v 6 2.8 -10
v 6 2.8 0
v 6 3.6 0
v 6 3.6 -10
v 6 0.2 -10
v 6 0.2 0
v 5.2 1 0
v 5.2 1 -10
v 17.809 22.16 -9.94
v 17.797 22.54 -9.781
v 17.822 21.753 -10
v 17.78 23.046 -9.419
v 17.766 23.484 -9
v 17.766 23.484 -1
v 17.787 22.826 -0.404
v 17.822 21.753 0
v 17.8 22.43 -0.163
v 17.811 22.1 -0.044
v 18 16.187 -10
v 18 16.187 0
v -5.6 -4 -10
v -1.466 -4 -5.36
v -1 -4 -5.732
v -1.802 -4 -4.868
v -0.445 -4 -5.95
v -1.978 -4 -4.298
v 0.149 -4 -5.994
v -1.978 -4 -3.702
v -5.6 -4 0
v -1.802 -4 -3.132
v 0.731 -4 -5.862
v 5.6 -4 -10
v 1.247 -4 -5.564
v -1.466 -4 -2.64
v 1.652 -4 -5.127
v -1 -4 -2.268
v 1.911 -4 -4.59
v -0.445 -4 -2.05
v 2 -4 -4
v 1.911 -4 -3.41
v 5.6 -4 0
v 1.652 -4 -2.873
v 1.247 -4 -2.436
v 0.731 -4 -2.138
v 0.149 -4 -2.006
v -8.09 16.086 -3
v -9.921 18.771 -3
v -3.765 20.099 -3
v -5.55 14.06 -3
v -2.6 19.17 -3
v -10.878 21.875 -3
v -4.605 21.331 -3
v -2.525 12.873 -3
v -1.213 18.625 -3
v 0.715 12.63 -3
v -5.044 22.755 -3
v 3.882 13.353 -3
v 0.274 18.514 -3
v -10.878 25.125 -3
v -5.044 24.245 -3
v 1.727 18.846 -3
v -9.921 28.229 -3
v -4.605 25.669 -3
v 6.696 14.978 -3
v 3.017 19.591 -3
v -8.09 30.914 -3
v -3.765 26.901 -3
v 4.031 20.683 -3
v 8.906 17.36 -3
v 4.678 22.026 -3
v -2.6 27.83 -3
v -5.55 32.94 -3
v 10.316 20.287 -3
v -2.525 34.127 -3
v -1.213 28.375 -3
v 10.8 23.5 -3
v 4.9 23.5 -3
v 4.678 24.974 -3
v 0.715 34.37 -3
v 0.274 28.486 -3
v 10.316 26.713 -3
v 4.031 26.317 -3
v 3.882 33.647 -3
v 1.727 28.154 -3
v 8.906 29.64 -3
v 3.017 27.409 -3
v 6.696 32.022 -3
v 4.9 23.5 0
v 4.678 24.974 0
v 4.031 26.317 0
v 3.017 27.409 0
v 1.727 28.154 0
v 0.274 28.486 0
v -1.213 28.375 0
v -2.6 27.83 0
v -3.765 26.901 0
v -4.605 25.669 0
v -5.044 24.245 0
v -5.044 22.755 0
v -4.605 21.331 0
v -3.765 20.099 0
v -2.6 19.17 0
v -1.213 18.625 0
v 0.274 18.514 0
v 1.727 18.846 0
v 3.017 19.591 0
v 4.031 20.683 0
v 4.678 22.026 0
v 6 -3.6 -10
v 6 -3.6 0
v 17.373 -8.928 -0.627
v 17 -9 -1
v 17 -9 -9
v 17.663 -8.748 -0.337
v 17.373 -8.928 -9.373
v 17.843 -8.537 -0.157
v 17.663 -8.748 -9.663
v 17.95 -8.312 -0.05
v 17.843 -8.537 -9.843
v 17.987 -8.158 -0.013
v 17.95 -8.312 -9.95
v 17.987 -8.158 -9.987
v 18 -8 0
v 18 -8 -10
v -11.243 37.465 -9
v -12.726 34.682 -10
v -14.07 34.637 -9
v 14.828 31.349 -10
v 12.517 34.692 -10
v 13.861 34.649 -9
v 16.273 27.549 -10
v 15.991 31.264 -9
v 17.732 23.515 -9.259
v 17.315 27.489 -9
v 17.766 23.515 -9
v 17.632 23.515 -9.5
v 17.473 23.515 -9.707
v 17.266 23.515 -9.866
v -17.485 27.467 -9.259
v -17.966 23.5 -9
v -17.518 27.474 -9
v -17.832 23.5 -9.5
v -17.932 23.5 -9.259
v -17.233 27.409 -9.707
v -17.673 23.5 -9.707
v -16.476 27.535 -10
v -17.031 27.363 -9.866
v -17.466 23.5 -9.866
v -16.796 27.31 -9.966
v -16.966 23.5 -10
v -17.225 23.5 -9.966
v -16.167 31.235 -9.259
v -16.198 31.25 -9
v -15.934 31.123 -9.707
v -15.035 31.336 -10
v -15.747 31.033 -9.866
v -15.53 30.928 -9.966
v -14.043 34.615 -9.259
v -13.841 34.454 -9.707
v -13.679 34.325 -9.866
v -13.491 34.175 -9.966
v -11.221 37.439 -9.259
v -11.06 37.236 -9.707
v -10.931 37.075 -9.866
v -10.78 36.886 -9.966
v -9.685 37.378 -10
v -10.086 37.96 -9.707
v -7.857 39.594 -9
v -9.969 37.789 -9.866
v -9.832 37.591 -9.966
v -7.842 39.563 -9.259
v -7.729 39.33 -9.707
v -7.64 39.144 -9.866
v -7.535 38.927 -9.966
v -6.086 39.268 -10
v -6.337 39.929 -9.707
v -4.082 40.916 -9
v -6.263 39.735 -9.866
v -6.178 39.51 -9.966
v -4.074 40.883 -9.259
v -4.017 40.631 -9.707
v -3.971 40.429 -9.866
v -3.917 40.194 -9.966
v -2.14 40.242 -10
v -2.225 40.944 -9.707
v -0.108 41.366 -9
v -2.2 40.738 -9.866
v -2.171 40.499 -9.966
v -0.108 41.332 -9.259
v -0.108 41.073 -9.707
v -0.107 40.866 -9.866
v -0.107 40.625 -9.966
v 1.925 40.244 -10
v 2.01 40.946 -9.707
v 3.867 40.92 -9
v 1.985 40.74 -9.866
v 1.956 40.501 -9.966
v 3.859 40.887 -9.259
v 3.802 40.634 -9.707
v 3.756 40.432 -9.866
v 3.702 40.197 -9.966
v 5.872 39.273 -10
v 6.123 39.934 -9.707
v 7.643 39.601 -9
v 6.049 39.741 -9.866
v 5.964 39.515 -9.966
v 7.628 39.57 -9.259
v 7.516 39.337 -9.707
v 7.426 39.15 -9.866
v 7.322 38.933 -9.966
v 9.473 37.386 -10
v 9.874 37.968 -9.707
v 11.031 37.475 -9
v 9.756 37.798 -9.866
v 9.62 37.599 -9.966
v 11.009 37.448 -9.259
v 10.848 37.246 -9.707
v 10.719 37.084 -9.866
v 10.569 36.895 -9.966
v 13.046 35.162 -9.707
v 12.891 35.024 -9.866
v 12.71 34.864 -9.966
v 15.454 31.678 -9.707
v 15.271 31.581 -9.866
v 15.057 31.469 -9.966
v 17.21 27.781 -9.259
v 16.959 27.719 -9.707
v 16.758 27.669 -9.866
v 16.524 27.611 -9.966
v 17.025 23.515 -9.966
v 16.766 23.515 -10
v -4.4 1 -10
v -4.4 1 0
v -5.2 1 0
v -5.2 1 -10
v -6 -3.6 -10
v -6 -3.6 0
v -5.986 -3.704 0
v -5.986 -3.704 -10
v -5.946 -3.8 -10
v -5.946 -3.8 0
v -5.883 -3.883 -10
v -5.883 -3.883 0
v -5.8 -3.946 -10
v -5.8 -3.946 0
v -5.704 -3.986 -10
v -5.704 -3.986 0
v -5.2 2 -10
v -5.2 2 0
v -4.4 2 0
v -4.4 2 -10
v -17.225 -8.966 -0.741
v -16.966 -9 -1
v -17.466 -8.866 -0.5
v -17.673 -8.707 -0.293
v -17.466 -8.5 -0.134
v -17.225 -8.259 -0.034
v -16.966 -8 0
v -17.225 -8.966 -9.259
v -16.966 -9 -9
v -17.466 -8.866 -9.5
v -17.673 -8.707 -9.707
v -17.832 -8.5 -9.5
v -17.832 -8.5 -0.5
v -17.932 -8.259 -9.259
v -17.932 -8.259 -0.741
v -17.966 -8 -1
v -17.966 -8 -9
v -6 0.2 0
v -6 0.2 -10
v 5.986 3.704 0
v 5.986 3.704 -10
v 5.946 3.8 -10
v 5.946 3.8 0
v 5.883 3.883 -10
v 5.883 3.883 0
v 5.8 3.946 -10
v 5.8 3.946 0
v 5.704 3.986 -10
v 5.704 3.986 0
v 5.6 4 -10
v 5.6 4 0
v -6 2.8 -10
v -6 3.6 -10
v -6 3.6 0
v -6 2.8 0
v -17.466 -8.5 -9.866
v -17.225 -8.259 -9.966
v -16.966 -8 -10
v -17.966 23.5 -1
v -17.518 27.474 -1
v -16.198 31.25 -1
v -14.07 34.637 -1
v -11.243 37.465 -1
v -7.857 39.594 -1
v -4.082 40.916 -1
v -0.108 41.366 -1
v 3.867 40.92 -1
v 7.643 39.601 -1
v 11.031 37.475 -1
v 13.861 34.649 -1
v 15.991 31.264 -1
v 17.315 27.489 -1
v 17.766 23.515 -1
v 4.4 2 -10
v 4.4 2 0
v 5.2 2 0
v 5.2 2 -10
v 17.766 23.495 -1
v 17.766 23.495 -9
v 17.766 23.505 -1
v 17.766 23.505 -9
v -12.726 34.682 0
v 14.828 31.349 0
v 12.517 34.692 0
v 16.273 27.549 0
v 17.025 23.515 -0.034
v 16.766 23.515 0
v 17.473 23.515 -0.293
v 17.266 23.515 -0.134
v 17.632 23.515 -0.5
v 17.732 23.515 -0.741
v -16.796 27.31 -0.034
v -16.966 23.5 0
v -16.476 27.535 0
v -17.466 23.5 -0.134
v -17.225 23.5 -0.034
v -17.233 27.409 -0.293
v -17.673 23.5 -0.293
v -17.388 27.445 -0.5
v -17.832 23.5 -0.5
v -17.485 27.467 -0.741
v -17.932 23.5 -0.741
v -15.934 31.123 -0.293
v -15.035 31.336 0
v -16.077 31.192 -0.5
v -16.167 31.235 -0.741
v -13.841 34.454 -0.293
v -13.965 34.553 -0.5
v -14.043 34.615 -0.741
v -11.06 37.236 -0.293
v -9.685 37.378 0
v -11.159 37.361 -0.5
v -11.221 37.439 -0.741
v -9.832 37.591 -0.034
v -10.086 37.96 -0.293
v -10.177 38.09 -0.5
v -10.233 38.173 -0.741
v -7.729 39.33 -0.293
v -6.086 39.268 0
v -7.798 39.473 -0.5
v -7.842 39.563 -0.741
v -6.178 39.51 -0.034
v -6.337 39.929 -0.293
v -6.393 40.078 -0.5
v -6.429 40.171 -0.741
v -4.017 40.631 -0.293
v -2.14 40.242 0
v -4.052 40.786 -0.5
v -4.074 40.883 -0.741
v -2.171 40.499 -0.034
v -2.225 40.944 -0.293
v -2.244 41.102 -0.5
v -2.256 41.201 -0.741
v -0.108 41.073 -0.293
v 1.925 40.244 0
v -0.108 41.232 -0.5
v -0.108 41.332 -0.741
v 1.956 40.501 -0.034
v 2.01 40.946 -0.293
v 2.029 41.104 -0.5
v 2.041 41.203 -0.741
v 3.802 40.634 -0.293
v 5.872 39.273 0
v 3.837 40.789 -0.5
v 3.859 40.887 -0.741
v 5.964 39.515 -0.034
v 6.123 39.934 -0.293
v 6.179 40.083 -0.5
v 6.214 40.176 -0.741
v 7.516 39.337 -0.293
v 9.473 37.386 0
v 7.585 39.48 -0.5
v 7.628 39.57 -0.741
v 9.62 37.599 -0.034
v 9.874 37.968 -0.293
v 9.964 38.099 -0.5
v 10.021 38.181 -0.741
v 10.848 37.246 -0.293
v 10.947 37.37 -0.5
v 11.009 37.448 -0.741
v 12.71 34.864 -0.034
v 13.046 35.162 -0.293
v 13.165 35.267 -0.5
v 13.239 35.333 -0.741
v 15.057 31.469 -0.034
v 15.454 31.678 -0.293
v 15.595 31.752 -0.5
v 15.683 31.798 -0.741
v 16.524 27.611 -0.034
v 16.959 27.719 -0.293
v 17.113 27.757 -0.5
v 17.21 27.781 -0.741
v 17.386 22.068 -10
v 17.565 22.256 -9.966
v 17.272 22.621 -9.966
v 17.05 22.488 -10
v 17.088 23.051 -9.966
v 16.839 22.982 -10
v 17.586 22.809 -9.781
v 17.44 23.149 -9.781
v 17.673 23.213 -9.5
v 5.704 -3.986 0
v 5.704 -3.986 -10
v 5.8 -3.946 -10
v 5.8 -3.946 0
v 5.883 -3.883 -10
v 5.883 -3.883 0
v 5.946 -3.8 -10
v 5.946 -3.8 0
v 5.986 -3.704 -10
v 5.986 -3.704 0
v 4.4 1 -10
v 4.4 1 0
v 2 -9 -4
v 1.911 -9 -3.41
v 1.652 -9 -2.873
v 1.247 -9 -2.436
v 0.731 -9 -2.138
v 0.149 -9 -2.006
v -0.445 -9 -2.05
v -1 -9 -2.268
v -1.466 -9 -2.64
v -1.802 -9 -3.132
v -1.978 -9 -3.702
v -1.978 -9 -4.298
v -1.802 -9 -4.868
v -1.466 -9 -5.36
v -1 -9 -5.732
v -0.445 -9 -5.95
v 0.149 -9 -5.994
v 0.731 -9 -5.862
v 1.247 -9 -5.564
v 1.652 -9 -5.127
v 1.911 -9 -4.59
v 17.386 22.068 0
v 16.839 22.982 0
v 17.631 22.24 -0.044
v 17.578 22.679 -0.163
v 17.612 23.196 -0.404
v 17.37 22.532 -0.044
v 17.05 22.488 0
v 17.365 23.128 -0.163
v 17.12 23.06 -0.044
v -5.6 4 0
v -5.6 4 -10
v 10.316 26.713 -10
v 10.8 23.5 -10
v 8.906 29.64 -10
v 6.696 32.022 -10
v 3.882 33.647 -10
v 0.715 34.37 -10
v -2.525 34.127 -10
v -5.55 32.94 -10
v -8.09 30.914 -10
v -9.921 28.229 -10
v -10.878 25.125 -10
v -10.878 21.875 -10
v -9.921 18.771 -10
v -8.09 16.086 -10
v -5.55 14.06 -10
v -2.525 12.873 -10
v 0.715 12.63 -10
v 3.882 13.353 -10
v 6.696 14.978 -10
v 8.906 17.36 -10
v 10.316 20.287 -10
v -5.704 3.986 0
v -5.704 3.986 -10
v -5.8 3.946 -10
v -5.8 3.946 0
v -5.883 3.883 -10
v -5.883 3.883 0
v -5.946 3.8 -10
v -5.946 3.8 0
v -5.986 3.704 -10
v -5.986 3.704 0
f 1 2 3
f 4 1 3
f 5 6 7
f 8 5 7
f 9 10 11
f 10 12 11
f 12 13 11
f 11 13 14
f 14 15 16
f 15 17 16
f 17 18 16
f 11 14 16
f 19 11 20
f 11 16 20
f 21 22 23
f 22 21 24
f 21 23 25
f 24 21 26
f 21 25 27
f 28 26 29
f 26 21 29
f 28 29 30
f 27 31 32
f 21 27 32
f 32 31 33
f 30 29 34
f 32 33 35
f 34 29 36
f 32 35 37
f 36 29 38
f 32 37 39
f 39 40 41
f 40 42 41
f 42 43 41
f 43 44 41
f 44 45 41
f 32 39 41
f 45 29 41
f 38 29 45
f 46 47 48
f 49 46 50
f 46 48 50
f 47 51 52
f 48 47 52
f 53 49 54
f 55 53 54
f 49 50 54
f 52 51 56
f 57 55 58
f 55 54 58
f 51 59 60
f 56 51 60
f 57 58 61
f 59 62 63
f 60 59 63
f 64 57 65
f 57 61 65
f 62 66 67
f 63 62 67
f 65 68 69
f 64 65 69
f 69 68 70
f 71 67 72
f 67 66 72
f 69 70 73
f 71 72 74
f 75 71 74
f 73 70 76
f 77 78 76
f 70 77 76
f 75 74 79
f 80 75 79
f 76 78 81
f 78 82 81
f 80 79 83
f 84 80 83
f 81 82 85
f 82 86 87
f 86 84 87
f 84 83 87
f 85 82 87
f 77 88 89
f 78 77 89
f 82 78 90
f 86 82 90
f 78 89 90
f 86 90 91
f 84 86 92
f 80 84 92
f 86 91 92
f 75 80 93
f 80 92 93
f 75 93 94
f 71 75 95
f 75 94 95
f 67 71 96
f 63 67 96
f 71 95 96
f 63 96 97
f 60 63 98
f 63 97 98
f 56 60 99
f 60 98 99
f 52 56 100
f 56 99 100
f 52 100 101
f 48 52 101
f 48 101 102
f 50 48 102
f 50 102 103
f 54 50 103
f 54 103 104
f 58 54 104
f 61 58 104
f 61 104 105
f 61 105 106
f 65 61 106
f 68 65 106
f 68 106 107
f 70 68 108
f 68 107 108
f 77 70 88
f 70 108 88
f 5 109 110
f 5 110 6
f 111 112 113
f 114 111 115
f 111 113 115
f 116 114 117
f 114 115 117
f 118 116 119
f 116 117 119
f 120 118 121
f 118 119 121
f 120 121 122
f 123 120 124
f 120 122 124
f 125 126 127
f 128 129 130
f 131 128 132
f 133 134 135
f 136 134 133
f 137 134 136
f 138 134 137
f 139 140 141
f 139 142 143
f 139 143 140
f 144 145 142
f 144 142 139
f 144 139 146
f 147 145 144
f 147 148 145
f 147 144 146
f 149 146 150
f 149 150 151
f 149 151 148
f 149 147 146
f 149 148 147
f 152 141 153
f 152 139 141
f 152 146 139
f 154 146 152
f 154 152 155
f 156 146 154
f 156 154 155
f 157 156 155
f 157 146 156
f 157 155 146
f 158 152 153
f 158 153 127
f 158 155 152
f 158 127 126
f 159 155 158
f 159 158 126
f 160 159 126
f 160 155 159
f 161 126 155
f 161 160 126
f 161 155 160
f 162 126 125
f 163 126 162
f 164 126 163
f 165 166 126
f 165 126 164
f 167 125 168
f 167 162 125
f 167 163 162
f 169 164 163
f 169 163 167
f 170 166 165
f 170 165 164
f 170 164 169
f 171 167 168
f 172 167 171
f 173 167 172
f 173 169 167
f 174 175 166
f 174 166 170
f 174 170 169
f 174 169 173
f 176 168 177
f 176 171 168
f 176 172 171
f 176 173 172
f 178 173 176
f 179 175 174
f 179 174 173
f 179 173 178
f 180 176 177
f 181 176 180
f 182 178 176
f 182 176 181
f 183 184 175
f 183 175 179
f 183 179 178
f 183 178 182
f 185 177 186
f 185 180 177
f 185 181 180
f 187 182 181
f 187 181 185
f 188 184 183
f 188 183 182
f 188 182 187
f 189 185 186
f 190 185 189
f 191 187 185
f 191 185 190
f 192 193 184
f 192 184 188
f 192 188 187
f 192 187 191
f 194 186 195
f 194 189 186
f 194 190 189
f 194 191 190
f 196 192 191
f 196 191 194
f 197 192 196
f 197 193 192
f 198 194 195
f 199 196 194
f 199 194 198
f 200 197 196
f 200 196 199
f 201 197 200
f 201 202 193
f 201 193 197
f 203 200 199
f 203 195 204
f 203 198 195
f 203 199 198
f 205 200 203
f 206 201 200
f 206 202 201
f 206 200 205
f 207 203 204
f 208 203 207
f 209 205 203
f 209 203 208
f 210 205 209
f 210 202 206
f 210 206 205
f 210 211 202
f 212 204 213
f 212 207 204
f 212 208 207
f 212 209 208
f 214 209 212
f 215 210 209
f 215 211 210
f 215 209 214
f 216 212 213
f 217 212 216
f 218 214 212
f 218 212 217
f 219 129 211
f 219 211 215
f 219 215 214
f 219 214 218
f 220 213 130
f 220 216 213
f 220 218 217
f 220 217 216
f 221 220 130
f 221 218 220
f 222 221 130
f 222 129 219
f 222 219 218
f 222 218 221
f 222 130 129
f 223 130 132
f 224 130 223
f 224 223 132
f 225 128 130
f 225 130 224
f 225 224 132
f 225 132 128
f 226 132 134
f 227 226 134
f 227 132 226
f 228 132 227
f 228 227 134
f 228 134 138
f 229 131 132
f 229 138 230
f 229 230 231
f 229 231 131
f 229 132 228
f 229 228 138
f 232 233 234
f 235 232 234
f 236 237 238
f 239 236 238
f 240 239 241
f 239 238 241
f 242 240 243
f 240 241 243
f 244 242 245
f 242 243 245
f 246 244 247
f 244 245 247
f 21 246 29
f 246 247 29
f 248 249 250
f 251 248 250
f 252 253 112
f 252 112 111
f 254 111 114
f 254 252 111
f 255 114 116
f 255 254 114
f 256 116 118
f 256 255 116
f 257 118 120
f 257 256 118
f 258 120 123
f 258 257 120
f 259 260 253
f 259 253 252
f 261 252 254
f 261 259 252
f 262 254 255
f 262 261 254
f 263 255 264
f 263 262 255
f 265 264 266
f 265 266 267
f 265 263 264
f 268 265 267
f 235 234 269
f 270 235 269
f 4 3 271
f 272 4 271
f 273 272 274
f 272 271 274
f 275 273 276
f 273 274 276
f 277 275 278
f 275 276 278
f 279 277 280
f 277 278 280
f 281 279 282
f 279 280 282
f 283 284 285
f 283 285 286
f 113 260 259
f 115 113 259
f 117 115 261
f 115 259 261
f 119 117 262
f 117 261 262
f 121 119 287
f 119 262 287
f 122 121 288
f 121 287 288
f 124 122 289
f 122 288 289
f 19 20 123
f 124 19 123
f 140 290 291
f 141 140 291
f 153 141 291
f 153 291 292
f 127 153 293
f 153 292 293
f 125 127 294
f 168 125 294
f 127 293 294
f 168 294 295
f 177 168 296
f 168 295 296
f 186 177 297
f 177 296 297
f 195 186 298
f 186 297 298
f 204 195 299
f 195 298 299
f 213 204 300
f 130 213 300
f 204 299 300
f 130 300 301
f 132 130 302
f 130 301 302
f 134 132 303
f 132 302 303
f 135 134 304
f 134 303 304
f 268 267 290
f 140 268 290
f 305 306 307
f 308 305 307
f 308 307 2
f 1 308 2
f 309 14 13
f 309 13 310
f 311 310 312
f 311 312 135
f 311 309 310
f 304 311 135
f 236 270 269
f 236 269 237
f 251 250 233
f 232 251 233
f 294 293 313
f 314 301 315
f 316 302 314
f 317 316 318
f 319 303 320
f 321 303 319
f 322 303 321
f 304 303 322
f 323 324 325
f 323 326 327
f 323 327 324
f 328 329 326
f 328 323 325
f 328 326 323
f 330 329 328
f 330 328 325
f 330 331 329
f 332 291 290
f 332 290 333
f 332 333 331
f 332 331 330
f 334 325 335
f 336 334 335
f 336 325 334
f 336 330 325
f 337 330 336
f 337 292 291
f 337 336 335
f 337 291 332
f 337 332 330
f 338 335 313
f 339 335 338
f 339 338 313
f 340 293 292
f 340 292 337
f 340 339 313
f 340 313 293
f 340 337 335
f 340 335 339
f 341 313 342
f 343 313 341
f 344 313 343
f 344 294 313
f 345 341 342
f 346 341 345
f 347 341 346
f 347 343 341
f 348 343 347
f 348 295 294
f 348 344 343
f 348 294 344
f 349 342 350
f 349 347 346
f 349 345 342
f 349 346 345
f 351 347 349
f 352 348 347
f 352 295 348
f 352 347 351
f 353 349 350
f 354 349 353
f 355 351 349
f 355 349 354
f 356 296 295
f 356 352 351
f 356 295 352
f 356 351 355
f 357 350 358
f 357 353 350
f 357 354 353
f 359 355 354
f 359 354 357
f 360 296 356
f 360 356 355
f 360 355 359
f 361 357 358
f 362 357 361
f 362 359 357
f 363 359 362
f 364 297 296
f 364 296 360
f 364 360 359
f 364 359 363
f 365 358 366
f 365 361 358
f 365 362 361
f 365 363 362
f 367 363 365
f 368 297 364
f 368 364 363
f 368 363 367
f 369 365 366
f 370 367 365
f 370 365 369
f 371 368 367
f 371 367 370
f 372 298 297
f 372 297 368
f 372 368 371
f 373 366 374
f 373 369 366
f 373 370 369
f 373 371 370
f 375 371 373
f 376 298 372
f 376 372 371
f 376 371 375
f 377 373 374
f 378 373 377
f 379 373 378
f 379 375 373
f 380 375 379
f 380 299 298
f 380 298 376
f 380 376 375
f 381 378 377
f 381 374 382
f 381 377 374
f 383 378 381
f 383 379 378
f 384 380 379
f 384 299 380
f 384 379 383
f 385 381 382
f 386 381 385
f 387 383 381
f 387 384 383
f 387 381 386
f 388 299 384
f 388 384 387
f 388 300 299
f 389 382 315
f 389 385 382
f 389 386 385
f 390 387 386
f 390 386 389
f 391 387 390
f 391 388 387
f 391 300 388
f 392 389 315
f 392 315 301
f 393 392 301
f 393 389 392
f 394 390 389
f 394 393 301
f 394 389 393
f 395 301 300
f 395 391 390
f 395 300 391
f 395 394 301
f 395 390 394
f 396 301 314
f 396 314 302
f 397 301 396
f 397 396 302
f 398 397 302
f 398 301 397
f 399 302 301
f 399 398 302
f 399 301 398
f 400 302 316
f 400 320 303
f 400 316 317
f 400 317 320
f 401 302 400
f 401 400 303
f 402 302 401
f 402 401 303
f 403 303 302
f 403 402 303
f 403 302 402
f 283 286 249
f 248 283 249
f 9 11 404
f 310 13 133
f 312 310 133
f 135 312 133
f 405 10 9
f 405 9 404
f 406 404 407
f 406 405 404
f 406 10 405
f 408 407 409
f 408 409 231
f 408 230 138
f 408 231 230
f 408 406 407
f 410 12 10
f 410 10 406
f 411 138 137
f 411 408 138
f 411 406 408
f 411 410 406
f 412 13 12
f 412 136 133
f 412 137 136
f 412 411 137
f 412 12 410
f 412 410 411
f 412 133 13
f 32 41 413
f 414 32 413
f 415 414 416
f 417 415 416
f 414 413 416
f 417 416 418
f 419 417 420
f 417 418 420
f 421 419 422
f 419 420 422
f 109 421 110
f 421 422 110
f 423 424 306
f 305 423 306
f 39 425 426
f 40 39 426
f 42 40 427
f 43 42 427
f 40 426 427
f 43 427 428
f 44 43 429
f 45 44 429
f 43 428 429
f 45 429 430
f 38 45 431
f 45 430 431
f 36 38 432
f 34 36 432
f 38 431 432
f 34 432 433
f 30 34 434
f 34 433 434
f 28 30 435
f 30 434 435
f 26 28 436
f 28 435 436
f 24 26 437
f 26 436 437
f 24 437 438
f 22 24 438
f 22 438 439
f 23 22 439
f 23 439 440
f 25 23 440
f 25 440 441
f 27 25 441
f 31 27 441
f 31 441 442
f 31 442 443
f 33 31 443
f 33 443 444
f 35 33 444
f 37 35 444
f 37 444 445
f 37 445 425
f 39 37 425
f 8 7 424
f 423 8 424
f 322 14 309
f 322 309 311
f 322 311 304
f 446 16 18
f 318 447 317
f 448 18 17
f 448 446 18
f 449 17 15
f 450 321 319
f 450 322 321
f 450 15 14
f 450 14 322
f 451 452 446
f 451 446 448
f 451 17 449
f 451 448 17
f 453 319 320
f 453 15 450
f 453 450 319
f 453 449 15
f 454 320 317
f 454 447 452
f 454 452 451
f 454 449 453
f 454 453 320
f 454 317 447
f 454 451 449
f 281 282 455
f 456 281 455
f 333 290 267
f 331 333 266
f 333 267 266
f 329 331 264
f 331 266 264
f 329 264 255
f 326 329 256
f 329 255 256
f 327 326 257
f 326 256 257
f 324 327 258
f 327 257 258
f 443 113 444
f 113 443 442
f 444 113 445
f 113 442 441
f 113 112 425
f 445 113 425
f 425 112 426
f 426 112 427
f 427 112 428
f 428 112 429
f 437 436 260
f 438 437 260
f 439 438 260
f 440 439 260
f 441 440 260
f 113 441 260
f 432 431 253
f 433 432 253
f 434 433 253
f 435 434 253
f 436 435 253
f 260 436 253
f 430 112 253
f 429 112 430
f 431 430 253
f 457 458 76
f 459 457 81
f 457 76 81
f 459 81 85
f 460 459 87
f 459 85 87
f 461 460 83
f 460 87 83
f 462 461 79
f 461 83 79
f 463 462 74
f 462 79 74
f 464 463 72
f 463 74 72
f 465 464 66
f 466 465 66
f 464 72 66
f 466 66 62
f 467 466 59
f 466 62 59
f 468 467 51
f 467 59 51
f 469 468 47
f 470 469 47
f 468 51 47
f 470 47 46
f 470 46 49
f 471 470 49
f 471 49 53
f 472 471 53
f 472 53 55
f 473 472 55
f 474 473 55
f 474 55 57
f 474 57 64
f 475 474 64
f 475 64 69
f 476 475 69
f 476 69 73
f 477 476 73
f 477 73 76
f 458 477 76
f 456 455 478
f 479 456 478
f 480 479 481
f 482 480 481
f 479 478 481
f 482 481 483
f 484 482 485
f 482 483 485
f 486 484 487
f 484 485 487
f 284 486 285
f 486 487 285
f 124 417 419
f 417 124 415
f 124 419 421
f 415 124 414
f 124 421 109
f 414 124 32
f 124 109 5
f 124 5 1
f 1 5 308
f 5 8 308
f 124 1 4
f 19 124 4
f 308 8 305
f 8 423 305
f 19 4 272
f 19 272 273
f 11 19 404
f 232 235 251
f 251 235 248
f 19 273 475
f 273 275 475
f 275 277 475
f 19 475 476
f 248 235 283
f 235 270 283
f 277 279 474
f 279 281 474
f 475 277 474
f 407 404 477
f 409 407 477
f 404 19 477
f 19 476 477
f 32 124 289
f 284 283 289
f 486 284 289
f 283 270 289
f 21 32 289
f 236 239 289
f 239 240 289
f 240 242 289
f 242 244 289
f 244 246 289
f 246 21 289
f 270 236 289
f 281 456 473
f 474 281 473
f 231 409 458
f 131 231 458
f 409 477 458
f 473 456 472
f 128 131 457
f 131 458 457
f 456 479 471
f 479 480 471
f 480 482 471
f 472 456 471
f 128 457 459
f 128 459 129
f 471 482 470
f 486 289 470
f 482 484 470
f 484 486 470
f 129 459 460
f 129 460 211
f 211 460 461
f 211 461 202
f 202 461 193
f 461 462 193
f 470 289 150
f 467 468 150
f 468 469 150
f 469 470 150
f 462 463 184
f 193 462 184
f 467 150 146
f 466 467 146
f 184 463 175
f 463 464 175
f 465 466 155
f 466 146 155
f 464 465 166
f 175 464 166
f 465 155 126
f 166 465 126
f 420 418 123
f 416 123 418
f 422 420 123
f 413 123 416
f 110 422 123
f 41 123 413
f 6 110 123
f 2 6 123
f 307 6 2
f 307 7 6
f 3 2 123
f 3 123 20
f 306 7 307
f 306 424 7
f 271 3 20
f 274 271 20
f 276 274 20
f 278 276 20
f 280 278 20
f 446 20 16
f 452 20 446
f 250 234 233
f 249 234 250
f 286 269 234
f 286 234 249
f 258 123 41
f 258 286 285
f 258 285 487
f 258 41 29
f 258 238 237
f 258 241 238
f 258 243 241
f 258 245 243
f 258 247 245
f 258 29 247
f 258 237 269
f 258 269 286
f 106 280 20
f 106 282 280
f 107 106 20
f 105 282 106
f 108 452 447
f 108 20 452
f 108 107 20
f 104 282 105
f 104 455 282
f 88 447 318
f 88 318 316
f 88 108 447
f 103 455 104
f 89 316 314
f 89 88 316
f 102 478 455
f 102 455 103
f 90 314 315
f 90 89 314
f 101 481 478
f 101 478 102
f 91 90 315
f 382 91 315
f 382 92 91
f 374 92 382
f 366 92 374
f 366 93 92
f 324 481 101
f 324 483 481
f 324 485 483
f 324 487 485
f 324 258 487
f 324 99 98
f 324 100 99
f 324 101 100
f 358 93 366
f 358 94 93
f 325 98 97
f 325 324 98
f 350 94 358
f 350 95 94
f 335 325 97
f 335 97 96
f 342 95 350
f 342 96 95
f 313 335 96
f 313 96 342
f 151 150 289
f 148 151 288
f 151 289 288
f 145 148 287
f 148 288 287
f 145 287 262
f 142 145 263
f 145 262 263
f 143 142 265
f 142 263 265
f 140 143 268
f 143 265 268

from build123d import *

# Parameters (mm, degrees)
SKETCH1_R           = 10.9
BOSS_EXTRUDE1_DEPTH = 10
FILLET5_R           = 1
FILLET1_R           = 1
SKETCH3_R           = 2
CUT_EXTRUDE2_DEPTH  = 8
SKETCH6_R           = 11.874719229
SKETCH6_R_2         = 5
BOSS_EXTRUDE3_DEPTH = 3


with BuildPart() as part:
    # Sketch1 → Boss-Extrude1 (new body)
    with BuildSketch(Plane.XY):
        with BuildLine():
            Line((18.000000111, 2.53629242), (18.000000111, -9))
            Line((18.000000111, -9), (-17.965840671, -9))
            Line((-17.965840671, -9), (-17.965840671, 23.5))
            ThreePointArc((-17.965840671, 23.5), (-0.099999918, 41.365840754), (17.765840836, 23.5))
            Line((17.765840836, 23.5), (18.000000111, 16.187309001))
            Line((18.000000111, 16.187309001), (18.000000111, 14.96196947))
            Line((18.000000111, 14.96196947), (18.000000111, 2.53629242))
        make_face()
        with Locations((-0.099999918, 23.5)):
            Circle(SKETCH1_R, mode=Mode.SUBTRACT)
        with BuildLine():
            Line((-4.4, 1), (-5.2, 1))
            Line((-5.2, 1), (-6, 0.2))
            Line((-6, 0.2), (-6, -3.6))
            ThreePointArc((-6, -3.6), (-5.882842712, -3.882842712), (-5.6, -4))
            Line((-5.6, -4), (5.6, -4))
            ThreePointArc((5.6, -4), (5.882842712, -3.882842712), (6, -3.6))
            Line((6, -3.6), (6, 0.2))
            Line((6, 0.2), (5.2, 1))
            Line((5.2, 1), (4.4, 1))
            Line((4.4, 1), (4.4, 2))
            Line((4.4, 2), (5.2, 2))
            Line((5.2, 2), (6, 2.8))
            Line((6, 2.8), (6, 3.6))
            ThreePointArc((6, 3.6), (5.882842712, 3.882842712), (5.6, 4))
            Line((5.6, 4), (-5.6, 4))
            ThreePointArc((-5.6, 4), (-5.882842712, 3.882842712), (-6, 3.6))
            Line((-6, 3.6), (-6, 2.8))
            Line((-6, 2.8), (-5.2, 2))
            Line((-5.2, 2), (-4.4, 2))
            Line((-4.4, 2), (-4.4, 1))
        make_face(mode=Mode.SUBTRACT)
    extrude(amount=-BOSS_EXTRUDE1_DEPTH)

    # Fillet5
    fillet5_edges = [part.edges().sort_by_distance(p)[0] for p in [
        (18.000000111, -9, -5),
        (-17.965840671, -9, -5),
        (0.01707972, -9, -10),
        (0.01707972, -9, 0),
    ]]
    fillet(fillet5_edges, radius=FILLET5_R)

    # Fillet1
    # the kernel refuses this fillet: 1 mm, written as the material it adds along each edge
    with BuildSketch(Plane(origin=(17.765840836, 23.5, 0), x_dir=(0.032004541259538756, -0.9994877234557543, 0), z_dir=(0, 0, -1))) as fillet1_piece_1:
        with BuildLine():
            CenterArc((0.015788393, -1), FILLET1_R, 90, 1.784765128)
            ThreePointArc((-0.015356597, -0.000485123), (-0.007678246, -0.000244212), (0, 0))
            Line((0, 0), (0.015788393, 0))
        make_face()
    extrude(amount=10)
    # the kernel refuses this fillet: 1 mm, written as the material it takes off along each edge
    with BuildSketch(Plane(origin=(-17.965840671, -10.5, -10), x_dir=(1, 0, 0), z_dir=(0, 1, 0)), Plane(origin=(-17.965840671, -10.5, 0), x_dir=(0, 0, -1), z_dir=(0, 1, 0))) as fillet1_2_piece_1:
        with BuildLine():
            CenterArc((FILLET1_R, -FILLET1_R), FILLET1_R, 90, 90)
            Line((0, -FILLET1_R), (0, 0))
            Line((0, 0), (FILLET1_R, 0))
        make_face()
    extrude(amount=34, mode=Mode.SUBTRACT)
    with BuildSketch(Plane(origin=(-0.099999918, 23.5, -10), x_dir=(-1, 0, 0), z_dir=(0, -1, 0))) as fillet1_2_piece_2:
        with BuildLine():
            CenterArc((17.865840754 - FILLET1_R, -FILLET1_R), FILLET1_R, 0, 90)
            Line((17.865840754, -FILLET1_R), (17.865840754, 0))
            Line((17.865840754, 0), (17.865840754 - FILLET1_R, 0))
        make_face()
    revolve(axis=Axis((-0.099999918, 23.5, -10), (0, 0, -1)), revolution_arc=179.950726799, mode=Mode.SUBTRACT)
    with BuildSketch(Plane(origin=(-0.099999918, 23.5, 0), x_dir=(-1, 0, 0), z_dir=(0, -1, 0))) as fillet1_2_piece_3:
        with BuildLine():
            CenterArc((17.865840754 - FILLET1_R, FILLET1_R), FILLET1_R, 270, 90)
            Line((17.865840754 - FILLET1_R, 0), (17.865840754, 0))
            Line((17.865840754, 0), (17.865840754, FILLET1_R))
        make_face()
    revolve(axis=Axis((-0.099999918, 23.5, 0), (0, 0, -1)), revolution_arc=179.950726799, mode=Mode.SUBTRACT)
    with BuildSketch(Plane(origin=(18.76583386, 23.516224236, 0), x_dir=(0.8198872609406254, -0.5725250032507568, 0), z_dir=(0.5725250032507568, 0.8198872609406254, 0))) as fillet1_2_piece_4:
        with BuildLine():
            CenterArc((1 + FILLET1_R, FILLET1_R), FILLET1_R, 180, 90)
            Line((1, FILLET1_R), (1, 0))
            Line((1, 0), (1 + FILLET1_R, 0))
        make_face()
    revolve(axis=Axis((18.76583386, 23.516224236, 0), (0, 0, -1)), revolution_arc=145.024236532, mode=Mode.SUBTRACT)
    with BuildSketch(Plane(origin=(18.76583386, 23.516224236, -10), x_dir=(0.8198872609406254, -0.5725250032507568, 0), z_dir=(0.5725250032507568, 0.8198872609406254, 0))) as fillet1_2_piece_5:
        with BuildLine():
            CenterArc((1 + FILLET1_R, -FILLET1_R), FILLET1_R, 90, 90)
            Line((1, -FILLET1_R), (1, 0))
            Line((1, 0), (1 + FILLET1_R, 0))
        make_face()
    revolve(axis=Axis((18.76583386, 23.516224236, -10), (0, 0, -1)), revolution_arc=145.024236532, mode=Mode.SUBTRACT)

    # Sketch3 → Cut-Extrude2 (cut)
    with BuildSketch(Plane.XZ.offset(9)):
        with Locations((0, -4)):
            Circle(SKETCH3_R)
    extrude(amount=-CUT_EXTRUDE2_DEPTH, mode=Mode.SUBTRACT)

    # Sketch6 → Boss-Extrude3 (add)
    with BuildSketch(Plane.XY):
        with Locations((-0.099999918, 23.5)):
            Circle(SKETCH6_R)
        with Locations((-0.099999918, 23.5)):
            Circle(SKETCH6_R_2, mode=Mode.SUBTRACT)
    extrude(amount=-BOSS_EXTRUDE3_DEPTH)


solid = part.part
